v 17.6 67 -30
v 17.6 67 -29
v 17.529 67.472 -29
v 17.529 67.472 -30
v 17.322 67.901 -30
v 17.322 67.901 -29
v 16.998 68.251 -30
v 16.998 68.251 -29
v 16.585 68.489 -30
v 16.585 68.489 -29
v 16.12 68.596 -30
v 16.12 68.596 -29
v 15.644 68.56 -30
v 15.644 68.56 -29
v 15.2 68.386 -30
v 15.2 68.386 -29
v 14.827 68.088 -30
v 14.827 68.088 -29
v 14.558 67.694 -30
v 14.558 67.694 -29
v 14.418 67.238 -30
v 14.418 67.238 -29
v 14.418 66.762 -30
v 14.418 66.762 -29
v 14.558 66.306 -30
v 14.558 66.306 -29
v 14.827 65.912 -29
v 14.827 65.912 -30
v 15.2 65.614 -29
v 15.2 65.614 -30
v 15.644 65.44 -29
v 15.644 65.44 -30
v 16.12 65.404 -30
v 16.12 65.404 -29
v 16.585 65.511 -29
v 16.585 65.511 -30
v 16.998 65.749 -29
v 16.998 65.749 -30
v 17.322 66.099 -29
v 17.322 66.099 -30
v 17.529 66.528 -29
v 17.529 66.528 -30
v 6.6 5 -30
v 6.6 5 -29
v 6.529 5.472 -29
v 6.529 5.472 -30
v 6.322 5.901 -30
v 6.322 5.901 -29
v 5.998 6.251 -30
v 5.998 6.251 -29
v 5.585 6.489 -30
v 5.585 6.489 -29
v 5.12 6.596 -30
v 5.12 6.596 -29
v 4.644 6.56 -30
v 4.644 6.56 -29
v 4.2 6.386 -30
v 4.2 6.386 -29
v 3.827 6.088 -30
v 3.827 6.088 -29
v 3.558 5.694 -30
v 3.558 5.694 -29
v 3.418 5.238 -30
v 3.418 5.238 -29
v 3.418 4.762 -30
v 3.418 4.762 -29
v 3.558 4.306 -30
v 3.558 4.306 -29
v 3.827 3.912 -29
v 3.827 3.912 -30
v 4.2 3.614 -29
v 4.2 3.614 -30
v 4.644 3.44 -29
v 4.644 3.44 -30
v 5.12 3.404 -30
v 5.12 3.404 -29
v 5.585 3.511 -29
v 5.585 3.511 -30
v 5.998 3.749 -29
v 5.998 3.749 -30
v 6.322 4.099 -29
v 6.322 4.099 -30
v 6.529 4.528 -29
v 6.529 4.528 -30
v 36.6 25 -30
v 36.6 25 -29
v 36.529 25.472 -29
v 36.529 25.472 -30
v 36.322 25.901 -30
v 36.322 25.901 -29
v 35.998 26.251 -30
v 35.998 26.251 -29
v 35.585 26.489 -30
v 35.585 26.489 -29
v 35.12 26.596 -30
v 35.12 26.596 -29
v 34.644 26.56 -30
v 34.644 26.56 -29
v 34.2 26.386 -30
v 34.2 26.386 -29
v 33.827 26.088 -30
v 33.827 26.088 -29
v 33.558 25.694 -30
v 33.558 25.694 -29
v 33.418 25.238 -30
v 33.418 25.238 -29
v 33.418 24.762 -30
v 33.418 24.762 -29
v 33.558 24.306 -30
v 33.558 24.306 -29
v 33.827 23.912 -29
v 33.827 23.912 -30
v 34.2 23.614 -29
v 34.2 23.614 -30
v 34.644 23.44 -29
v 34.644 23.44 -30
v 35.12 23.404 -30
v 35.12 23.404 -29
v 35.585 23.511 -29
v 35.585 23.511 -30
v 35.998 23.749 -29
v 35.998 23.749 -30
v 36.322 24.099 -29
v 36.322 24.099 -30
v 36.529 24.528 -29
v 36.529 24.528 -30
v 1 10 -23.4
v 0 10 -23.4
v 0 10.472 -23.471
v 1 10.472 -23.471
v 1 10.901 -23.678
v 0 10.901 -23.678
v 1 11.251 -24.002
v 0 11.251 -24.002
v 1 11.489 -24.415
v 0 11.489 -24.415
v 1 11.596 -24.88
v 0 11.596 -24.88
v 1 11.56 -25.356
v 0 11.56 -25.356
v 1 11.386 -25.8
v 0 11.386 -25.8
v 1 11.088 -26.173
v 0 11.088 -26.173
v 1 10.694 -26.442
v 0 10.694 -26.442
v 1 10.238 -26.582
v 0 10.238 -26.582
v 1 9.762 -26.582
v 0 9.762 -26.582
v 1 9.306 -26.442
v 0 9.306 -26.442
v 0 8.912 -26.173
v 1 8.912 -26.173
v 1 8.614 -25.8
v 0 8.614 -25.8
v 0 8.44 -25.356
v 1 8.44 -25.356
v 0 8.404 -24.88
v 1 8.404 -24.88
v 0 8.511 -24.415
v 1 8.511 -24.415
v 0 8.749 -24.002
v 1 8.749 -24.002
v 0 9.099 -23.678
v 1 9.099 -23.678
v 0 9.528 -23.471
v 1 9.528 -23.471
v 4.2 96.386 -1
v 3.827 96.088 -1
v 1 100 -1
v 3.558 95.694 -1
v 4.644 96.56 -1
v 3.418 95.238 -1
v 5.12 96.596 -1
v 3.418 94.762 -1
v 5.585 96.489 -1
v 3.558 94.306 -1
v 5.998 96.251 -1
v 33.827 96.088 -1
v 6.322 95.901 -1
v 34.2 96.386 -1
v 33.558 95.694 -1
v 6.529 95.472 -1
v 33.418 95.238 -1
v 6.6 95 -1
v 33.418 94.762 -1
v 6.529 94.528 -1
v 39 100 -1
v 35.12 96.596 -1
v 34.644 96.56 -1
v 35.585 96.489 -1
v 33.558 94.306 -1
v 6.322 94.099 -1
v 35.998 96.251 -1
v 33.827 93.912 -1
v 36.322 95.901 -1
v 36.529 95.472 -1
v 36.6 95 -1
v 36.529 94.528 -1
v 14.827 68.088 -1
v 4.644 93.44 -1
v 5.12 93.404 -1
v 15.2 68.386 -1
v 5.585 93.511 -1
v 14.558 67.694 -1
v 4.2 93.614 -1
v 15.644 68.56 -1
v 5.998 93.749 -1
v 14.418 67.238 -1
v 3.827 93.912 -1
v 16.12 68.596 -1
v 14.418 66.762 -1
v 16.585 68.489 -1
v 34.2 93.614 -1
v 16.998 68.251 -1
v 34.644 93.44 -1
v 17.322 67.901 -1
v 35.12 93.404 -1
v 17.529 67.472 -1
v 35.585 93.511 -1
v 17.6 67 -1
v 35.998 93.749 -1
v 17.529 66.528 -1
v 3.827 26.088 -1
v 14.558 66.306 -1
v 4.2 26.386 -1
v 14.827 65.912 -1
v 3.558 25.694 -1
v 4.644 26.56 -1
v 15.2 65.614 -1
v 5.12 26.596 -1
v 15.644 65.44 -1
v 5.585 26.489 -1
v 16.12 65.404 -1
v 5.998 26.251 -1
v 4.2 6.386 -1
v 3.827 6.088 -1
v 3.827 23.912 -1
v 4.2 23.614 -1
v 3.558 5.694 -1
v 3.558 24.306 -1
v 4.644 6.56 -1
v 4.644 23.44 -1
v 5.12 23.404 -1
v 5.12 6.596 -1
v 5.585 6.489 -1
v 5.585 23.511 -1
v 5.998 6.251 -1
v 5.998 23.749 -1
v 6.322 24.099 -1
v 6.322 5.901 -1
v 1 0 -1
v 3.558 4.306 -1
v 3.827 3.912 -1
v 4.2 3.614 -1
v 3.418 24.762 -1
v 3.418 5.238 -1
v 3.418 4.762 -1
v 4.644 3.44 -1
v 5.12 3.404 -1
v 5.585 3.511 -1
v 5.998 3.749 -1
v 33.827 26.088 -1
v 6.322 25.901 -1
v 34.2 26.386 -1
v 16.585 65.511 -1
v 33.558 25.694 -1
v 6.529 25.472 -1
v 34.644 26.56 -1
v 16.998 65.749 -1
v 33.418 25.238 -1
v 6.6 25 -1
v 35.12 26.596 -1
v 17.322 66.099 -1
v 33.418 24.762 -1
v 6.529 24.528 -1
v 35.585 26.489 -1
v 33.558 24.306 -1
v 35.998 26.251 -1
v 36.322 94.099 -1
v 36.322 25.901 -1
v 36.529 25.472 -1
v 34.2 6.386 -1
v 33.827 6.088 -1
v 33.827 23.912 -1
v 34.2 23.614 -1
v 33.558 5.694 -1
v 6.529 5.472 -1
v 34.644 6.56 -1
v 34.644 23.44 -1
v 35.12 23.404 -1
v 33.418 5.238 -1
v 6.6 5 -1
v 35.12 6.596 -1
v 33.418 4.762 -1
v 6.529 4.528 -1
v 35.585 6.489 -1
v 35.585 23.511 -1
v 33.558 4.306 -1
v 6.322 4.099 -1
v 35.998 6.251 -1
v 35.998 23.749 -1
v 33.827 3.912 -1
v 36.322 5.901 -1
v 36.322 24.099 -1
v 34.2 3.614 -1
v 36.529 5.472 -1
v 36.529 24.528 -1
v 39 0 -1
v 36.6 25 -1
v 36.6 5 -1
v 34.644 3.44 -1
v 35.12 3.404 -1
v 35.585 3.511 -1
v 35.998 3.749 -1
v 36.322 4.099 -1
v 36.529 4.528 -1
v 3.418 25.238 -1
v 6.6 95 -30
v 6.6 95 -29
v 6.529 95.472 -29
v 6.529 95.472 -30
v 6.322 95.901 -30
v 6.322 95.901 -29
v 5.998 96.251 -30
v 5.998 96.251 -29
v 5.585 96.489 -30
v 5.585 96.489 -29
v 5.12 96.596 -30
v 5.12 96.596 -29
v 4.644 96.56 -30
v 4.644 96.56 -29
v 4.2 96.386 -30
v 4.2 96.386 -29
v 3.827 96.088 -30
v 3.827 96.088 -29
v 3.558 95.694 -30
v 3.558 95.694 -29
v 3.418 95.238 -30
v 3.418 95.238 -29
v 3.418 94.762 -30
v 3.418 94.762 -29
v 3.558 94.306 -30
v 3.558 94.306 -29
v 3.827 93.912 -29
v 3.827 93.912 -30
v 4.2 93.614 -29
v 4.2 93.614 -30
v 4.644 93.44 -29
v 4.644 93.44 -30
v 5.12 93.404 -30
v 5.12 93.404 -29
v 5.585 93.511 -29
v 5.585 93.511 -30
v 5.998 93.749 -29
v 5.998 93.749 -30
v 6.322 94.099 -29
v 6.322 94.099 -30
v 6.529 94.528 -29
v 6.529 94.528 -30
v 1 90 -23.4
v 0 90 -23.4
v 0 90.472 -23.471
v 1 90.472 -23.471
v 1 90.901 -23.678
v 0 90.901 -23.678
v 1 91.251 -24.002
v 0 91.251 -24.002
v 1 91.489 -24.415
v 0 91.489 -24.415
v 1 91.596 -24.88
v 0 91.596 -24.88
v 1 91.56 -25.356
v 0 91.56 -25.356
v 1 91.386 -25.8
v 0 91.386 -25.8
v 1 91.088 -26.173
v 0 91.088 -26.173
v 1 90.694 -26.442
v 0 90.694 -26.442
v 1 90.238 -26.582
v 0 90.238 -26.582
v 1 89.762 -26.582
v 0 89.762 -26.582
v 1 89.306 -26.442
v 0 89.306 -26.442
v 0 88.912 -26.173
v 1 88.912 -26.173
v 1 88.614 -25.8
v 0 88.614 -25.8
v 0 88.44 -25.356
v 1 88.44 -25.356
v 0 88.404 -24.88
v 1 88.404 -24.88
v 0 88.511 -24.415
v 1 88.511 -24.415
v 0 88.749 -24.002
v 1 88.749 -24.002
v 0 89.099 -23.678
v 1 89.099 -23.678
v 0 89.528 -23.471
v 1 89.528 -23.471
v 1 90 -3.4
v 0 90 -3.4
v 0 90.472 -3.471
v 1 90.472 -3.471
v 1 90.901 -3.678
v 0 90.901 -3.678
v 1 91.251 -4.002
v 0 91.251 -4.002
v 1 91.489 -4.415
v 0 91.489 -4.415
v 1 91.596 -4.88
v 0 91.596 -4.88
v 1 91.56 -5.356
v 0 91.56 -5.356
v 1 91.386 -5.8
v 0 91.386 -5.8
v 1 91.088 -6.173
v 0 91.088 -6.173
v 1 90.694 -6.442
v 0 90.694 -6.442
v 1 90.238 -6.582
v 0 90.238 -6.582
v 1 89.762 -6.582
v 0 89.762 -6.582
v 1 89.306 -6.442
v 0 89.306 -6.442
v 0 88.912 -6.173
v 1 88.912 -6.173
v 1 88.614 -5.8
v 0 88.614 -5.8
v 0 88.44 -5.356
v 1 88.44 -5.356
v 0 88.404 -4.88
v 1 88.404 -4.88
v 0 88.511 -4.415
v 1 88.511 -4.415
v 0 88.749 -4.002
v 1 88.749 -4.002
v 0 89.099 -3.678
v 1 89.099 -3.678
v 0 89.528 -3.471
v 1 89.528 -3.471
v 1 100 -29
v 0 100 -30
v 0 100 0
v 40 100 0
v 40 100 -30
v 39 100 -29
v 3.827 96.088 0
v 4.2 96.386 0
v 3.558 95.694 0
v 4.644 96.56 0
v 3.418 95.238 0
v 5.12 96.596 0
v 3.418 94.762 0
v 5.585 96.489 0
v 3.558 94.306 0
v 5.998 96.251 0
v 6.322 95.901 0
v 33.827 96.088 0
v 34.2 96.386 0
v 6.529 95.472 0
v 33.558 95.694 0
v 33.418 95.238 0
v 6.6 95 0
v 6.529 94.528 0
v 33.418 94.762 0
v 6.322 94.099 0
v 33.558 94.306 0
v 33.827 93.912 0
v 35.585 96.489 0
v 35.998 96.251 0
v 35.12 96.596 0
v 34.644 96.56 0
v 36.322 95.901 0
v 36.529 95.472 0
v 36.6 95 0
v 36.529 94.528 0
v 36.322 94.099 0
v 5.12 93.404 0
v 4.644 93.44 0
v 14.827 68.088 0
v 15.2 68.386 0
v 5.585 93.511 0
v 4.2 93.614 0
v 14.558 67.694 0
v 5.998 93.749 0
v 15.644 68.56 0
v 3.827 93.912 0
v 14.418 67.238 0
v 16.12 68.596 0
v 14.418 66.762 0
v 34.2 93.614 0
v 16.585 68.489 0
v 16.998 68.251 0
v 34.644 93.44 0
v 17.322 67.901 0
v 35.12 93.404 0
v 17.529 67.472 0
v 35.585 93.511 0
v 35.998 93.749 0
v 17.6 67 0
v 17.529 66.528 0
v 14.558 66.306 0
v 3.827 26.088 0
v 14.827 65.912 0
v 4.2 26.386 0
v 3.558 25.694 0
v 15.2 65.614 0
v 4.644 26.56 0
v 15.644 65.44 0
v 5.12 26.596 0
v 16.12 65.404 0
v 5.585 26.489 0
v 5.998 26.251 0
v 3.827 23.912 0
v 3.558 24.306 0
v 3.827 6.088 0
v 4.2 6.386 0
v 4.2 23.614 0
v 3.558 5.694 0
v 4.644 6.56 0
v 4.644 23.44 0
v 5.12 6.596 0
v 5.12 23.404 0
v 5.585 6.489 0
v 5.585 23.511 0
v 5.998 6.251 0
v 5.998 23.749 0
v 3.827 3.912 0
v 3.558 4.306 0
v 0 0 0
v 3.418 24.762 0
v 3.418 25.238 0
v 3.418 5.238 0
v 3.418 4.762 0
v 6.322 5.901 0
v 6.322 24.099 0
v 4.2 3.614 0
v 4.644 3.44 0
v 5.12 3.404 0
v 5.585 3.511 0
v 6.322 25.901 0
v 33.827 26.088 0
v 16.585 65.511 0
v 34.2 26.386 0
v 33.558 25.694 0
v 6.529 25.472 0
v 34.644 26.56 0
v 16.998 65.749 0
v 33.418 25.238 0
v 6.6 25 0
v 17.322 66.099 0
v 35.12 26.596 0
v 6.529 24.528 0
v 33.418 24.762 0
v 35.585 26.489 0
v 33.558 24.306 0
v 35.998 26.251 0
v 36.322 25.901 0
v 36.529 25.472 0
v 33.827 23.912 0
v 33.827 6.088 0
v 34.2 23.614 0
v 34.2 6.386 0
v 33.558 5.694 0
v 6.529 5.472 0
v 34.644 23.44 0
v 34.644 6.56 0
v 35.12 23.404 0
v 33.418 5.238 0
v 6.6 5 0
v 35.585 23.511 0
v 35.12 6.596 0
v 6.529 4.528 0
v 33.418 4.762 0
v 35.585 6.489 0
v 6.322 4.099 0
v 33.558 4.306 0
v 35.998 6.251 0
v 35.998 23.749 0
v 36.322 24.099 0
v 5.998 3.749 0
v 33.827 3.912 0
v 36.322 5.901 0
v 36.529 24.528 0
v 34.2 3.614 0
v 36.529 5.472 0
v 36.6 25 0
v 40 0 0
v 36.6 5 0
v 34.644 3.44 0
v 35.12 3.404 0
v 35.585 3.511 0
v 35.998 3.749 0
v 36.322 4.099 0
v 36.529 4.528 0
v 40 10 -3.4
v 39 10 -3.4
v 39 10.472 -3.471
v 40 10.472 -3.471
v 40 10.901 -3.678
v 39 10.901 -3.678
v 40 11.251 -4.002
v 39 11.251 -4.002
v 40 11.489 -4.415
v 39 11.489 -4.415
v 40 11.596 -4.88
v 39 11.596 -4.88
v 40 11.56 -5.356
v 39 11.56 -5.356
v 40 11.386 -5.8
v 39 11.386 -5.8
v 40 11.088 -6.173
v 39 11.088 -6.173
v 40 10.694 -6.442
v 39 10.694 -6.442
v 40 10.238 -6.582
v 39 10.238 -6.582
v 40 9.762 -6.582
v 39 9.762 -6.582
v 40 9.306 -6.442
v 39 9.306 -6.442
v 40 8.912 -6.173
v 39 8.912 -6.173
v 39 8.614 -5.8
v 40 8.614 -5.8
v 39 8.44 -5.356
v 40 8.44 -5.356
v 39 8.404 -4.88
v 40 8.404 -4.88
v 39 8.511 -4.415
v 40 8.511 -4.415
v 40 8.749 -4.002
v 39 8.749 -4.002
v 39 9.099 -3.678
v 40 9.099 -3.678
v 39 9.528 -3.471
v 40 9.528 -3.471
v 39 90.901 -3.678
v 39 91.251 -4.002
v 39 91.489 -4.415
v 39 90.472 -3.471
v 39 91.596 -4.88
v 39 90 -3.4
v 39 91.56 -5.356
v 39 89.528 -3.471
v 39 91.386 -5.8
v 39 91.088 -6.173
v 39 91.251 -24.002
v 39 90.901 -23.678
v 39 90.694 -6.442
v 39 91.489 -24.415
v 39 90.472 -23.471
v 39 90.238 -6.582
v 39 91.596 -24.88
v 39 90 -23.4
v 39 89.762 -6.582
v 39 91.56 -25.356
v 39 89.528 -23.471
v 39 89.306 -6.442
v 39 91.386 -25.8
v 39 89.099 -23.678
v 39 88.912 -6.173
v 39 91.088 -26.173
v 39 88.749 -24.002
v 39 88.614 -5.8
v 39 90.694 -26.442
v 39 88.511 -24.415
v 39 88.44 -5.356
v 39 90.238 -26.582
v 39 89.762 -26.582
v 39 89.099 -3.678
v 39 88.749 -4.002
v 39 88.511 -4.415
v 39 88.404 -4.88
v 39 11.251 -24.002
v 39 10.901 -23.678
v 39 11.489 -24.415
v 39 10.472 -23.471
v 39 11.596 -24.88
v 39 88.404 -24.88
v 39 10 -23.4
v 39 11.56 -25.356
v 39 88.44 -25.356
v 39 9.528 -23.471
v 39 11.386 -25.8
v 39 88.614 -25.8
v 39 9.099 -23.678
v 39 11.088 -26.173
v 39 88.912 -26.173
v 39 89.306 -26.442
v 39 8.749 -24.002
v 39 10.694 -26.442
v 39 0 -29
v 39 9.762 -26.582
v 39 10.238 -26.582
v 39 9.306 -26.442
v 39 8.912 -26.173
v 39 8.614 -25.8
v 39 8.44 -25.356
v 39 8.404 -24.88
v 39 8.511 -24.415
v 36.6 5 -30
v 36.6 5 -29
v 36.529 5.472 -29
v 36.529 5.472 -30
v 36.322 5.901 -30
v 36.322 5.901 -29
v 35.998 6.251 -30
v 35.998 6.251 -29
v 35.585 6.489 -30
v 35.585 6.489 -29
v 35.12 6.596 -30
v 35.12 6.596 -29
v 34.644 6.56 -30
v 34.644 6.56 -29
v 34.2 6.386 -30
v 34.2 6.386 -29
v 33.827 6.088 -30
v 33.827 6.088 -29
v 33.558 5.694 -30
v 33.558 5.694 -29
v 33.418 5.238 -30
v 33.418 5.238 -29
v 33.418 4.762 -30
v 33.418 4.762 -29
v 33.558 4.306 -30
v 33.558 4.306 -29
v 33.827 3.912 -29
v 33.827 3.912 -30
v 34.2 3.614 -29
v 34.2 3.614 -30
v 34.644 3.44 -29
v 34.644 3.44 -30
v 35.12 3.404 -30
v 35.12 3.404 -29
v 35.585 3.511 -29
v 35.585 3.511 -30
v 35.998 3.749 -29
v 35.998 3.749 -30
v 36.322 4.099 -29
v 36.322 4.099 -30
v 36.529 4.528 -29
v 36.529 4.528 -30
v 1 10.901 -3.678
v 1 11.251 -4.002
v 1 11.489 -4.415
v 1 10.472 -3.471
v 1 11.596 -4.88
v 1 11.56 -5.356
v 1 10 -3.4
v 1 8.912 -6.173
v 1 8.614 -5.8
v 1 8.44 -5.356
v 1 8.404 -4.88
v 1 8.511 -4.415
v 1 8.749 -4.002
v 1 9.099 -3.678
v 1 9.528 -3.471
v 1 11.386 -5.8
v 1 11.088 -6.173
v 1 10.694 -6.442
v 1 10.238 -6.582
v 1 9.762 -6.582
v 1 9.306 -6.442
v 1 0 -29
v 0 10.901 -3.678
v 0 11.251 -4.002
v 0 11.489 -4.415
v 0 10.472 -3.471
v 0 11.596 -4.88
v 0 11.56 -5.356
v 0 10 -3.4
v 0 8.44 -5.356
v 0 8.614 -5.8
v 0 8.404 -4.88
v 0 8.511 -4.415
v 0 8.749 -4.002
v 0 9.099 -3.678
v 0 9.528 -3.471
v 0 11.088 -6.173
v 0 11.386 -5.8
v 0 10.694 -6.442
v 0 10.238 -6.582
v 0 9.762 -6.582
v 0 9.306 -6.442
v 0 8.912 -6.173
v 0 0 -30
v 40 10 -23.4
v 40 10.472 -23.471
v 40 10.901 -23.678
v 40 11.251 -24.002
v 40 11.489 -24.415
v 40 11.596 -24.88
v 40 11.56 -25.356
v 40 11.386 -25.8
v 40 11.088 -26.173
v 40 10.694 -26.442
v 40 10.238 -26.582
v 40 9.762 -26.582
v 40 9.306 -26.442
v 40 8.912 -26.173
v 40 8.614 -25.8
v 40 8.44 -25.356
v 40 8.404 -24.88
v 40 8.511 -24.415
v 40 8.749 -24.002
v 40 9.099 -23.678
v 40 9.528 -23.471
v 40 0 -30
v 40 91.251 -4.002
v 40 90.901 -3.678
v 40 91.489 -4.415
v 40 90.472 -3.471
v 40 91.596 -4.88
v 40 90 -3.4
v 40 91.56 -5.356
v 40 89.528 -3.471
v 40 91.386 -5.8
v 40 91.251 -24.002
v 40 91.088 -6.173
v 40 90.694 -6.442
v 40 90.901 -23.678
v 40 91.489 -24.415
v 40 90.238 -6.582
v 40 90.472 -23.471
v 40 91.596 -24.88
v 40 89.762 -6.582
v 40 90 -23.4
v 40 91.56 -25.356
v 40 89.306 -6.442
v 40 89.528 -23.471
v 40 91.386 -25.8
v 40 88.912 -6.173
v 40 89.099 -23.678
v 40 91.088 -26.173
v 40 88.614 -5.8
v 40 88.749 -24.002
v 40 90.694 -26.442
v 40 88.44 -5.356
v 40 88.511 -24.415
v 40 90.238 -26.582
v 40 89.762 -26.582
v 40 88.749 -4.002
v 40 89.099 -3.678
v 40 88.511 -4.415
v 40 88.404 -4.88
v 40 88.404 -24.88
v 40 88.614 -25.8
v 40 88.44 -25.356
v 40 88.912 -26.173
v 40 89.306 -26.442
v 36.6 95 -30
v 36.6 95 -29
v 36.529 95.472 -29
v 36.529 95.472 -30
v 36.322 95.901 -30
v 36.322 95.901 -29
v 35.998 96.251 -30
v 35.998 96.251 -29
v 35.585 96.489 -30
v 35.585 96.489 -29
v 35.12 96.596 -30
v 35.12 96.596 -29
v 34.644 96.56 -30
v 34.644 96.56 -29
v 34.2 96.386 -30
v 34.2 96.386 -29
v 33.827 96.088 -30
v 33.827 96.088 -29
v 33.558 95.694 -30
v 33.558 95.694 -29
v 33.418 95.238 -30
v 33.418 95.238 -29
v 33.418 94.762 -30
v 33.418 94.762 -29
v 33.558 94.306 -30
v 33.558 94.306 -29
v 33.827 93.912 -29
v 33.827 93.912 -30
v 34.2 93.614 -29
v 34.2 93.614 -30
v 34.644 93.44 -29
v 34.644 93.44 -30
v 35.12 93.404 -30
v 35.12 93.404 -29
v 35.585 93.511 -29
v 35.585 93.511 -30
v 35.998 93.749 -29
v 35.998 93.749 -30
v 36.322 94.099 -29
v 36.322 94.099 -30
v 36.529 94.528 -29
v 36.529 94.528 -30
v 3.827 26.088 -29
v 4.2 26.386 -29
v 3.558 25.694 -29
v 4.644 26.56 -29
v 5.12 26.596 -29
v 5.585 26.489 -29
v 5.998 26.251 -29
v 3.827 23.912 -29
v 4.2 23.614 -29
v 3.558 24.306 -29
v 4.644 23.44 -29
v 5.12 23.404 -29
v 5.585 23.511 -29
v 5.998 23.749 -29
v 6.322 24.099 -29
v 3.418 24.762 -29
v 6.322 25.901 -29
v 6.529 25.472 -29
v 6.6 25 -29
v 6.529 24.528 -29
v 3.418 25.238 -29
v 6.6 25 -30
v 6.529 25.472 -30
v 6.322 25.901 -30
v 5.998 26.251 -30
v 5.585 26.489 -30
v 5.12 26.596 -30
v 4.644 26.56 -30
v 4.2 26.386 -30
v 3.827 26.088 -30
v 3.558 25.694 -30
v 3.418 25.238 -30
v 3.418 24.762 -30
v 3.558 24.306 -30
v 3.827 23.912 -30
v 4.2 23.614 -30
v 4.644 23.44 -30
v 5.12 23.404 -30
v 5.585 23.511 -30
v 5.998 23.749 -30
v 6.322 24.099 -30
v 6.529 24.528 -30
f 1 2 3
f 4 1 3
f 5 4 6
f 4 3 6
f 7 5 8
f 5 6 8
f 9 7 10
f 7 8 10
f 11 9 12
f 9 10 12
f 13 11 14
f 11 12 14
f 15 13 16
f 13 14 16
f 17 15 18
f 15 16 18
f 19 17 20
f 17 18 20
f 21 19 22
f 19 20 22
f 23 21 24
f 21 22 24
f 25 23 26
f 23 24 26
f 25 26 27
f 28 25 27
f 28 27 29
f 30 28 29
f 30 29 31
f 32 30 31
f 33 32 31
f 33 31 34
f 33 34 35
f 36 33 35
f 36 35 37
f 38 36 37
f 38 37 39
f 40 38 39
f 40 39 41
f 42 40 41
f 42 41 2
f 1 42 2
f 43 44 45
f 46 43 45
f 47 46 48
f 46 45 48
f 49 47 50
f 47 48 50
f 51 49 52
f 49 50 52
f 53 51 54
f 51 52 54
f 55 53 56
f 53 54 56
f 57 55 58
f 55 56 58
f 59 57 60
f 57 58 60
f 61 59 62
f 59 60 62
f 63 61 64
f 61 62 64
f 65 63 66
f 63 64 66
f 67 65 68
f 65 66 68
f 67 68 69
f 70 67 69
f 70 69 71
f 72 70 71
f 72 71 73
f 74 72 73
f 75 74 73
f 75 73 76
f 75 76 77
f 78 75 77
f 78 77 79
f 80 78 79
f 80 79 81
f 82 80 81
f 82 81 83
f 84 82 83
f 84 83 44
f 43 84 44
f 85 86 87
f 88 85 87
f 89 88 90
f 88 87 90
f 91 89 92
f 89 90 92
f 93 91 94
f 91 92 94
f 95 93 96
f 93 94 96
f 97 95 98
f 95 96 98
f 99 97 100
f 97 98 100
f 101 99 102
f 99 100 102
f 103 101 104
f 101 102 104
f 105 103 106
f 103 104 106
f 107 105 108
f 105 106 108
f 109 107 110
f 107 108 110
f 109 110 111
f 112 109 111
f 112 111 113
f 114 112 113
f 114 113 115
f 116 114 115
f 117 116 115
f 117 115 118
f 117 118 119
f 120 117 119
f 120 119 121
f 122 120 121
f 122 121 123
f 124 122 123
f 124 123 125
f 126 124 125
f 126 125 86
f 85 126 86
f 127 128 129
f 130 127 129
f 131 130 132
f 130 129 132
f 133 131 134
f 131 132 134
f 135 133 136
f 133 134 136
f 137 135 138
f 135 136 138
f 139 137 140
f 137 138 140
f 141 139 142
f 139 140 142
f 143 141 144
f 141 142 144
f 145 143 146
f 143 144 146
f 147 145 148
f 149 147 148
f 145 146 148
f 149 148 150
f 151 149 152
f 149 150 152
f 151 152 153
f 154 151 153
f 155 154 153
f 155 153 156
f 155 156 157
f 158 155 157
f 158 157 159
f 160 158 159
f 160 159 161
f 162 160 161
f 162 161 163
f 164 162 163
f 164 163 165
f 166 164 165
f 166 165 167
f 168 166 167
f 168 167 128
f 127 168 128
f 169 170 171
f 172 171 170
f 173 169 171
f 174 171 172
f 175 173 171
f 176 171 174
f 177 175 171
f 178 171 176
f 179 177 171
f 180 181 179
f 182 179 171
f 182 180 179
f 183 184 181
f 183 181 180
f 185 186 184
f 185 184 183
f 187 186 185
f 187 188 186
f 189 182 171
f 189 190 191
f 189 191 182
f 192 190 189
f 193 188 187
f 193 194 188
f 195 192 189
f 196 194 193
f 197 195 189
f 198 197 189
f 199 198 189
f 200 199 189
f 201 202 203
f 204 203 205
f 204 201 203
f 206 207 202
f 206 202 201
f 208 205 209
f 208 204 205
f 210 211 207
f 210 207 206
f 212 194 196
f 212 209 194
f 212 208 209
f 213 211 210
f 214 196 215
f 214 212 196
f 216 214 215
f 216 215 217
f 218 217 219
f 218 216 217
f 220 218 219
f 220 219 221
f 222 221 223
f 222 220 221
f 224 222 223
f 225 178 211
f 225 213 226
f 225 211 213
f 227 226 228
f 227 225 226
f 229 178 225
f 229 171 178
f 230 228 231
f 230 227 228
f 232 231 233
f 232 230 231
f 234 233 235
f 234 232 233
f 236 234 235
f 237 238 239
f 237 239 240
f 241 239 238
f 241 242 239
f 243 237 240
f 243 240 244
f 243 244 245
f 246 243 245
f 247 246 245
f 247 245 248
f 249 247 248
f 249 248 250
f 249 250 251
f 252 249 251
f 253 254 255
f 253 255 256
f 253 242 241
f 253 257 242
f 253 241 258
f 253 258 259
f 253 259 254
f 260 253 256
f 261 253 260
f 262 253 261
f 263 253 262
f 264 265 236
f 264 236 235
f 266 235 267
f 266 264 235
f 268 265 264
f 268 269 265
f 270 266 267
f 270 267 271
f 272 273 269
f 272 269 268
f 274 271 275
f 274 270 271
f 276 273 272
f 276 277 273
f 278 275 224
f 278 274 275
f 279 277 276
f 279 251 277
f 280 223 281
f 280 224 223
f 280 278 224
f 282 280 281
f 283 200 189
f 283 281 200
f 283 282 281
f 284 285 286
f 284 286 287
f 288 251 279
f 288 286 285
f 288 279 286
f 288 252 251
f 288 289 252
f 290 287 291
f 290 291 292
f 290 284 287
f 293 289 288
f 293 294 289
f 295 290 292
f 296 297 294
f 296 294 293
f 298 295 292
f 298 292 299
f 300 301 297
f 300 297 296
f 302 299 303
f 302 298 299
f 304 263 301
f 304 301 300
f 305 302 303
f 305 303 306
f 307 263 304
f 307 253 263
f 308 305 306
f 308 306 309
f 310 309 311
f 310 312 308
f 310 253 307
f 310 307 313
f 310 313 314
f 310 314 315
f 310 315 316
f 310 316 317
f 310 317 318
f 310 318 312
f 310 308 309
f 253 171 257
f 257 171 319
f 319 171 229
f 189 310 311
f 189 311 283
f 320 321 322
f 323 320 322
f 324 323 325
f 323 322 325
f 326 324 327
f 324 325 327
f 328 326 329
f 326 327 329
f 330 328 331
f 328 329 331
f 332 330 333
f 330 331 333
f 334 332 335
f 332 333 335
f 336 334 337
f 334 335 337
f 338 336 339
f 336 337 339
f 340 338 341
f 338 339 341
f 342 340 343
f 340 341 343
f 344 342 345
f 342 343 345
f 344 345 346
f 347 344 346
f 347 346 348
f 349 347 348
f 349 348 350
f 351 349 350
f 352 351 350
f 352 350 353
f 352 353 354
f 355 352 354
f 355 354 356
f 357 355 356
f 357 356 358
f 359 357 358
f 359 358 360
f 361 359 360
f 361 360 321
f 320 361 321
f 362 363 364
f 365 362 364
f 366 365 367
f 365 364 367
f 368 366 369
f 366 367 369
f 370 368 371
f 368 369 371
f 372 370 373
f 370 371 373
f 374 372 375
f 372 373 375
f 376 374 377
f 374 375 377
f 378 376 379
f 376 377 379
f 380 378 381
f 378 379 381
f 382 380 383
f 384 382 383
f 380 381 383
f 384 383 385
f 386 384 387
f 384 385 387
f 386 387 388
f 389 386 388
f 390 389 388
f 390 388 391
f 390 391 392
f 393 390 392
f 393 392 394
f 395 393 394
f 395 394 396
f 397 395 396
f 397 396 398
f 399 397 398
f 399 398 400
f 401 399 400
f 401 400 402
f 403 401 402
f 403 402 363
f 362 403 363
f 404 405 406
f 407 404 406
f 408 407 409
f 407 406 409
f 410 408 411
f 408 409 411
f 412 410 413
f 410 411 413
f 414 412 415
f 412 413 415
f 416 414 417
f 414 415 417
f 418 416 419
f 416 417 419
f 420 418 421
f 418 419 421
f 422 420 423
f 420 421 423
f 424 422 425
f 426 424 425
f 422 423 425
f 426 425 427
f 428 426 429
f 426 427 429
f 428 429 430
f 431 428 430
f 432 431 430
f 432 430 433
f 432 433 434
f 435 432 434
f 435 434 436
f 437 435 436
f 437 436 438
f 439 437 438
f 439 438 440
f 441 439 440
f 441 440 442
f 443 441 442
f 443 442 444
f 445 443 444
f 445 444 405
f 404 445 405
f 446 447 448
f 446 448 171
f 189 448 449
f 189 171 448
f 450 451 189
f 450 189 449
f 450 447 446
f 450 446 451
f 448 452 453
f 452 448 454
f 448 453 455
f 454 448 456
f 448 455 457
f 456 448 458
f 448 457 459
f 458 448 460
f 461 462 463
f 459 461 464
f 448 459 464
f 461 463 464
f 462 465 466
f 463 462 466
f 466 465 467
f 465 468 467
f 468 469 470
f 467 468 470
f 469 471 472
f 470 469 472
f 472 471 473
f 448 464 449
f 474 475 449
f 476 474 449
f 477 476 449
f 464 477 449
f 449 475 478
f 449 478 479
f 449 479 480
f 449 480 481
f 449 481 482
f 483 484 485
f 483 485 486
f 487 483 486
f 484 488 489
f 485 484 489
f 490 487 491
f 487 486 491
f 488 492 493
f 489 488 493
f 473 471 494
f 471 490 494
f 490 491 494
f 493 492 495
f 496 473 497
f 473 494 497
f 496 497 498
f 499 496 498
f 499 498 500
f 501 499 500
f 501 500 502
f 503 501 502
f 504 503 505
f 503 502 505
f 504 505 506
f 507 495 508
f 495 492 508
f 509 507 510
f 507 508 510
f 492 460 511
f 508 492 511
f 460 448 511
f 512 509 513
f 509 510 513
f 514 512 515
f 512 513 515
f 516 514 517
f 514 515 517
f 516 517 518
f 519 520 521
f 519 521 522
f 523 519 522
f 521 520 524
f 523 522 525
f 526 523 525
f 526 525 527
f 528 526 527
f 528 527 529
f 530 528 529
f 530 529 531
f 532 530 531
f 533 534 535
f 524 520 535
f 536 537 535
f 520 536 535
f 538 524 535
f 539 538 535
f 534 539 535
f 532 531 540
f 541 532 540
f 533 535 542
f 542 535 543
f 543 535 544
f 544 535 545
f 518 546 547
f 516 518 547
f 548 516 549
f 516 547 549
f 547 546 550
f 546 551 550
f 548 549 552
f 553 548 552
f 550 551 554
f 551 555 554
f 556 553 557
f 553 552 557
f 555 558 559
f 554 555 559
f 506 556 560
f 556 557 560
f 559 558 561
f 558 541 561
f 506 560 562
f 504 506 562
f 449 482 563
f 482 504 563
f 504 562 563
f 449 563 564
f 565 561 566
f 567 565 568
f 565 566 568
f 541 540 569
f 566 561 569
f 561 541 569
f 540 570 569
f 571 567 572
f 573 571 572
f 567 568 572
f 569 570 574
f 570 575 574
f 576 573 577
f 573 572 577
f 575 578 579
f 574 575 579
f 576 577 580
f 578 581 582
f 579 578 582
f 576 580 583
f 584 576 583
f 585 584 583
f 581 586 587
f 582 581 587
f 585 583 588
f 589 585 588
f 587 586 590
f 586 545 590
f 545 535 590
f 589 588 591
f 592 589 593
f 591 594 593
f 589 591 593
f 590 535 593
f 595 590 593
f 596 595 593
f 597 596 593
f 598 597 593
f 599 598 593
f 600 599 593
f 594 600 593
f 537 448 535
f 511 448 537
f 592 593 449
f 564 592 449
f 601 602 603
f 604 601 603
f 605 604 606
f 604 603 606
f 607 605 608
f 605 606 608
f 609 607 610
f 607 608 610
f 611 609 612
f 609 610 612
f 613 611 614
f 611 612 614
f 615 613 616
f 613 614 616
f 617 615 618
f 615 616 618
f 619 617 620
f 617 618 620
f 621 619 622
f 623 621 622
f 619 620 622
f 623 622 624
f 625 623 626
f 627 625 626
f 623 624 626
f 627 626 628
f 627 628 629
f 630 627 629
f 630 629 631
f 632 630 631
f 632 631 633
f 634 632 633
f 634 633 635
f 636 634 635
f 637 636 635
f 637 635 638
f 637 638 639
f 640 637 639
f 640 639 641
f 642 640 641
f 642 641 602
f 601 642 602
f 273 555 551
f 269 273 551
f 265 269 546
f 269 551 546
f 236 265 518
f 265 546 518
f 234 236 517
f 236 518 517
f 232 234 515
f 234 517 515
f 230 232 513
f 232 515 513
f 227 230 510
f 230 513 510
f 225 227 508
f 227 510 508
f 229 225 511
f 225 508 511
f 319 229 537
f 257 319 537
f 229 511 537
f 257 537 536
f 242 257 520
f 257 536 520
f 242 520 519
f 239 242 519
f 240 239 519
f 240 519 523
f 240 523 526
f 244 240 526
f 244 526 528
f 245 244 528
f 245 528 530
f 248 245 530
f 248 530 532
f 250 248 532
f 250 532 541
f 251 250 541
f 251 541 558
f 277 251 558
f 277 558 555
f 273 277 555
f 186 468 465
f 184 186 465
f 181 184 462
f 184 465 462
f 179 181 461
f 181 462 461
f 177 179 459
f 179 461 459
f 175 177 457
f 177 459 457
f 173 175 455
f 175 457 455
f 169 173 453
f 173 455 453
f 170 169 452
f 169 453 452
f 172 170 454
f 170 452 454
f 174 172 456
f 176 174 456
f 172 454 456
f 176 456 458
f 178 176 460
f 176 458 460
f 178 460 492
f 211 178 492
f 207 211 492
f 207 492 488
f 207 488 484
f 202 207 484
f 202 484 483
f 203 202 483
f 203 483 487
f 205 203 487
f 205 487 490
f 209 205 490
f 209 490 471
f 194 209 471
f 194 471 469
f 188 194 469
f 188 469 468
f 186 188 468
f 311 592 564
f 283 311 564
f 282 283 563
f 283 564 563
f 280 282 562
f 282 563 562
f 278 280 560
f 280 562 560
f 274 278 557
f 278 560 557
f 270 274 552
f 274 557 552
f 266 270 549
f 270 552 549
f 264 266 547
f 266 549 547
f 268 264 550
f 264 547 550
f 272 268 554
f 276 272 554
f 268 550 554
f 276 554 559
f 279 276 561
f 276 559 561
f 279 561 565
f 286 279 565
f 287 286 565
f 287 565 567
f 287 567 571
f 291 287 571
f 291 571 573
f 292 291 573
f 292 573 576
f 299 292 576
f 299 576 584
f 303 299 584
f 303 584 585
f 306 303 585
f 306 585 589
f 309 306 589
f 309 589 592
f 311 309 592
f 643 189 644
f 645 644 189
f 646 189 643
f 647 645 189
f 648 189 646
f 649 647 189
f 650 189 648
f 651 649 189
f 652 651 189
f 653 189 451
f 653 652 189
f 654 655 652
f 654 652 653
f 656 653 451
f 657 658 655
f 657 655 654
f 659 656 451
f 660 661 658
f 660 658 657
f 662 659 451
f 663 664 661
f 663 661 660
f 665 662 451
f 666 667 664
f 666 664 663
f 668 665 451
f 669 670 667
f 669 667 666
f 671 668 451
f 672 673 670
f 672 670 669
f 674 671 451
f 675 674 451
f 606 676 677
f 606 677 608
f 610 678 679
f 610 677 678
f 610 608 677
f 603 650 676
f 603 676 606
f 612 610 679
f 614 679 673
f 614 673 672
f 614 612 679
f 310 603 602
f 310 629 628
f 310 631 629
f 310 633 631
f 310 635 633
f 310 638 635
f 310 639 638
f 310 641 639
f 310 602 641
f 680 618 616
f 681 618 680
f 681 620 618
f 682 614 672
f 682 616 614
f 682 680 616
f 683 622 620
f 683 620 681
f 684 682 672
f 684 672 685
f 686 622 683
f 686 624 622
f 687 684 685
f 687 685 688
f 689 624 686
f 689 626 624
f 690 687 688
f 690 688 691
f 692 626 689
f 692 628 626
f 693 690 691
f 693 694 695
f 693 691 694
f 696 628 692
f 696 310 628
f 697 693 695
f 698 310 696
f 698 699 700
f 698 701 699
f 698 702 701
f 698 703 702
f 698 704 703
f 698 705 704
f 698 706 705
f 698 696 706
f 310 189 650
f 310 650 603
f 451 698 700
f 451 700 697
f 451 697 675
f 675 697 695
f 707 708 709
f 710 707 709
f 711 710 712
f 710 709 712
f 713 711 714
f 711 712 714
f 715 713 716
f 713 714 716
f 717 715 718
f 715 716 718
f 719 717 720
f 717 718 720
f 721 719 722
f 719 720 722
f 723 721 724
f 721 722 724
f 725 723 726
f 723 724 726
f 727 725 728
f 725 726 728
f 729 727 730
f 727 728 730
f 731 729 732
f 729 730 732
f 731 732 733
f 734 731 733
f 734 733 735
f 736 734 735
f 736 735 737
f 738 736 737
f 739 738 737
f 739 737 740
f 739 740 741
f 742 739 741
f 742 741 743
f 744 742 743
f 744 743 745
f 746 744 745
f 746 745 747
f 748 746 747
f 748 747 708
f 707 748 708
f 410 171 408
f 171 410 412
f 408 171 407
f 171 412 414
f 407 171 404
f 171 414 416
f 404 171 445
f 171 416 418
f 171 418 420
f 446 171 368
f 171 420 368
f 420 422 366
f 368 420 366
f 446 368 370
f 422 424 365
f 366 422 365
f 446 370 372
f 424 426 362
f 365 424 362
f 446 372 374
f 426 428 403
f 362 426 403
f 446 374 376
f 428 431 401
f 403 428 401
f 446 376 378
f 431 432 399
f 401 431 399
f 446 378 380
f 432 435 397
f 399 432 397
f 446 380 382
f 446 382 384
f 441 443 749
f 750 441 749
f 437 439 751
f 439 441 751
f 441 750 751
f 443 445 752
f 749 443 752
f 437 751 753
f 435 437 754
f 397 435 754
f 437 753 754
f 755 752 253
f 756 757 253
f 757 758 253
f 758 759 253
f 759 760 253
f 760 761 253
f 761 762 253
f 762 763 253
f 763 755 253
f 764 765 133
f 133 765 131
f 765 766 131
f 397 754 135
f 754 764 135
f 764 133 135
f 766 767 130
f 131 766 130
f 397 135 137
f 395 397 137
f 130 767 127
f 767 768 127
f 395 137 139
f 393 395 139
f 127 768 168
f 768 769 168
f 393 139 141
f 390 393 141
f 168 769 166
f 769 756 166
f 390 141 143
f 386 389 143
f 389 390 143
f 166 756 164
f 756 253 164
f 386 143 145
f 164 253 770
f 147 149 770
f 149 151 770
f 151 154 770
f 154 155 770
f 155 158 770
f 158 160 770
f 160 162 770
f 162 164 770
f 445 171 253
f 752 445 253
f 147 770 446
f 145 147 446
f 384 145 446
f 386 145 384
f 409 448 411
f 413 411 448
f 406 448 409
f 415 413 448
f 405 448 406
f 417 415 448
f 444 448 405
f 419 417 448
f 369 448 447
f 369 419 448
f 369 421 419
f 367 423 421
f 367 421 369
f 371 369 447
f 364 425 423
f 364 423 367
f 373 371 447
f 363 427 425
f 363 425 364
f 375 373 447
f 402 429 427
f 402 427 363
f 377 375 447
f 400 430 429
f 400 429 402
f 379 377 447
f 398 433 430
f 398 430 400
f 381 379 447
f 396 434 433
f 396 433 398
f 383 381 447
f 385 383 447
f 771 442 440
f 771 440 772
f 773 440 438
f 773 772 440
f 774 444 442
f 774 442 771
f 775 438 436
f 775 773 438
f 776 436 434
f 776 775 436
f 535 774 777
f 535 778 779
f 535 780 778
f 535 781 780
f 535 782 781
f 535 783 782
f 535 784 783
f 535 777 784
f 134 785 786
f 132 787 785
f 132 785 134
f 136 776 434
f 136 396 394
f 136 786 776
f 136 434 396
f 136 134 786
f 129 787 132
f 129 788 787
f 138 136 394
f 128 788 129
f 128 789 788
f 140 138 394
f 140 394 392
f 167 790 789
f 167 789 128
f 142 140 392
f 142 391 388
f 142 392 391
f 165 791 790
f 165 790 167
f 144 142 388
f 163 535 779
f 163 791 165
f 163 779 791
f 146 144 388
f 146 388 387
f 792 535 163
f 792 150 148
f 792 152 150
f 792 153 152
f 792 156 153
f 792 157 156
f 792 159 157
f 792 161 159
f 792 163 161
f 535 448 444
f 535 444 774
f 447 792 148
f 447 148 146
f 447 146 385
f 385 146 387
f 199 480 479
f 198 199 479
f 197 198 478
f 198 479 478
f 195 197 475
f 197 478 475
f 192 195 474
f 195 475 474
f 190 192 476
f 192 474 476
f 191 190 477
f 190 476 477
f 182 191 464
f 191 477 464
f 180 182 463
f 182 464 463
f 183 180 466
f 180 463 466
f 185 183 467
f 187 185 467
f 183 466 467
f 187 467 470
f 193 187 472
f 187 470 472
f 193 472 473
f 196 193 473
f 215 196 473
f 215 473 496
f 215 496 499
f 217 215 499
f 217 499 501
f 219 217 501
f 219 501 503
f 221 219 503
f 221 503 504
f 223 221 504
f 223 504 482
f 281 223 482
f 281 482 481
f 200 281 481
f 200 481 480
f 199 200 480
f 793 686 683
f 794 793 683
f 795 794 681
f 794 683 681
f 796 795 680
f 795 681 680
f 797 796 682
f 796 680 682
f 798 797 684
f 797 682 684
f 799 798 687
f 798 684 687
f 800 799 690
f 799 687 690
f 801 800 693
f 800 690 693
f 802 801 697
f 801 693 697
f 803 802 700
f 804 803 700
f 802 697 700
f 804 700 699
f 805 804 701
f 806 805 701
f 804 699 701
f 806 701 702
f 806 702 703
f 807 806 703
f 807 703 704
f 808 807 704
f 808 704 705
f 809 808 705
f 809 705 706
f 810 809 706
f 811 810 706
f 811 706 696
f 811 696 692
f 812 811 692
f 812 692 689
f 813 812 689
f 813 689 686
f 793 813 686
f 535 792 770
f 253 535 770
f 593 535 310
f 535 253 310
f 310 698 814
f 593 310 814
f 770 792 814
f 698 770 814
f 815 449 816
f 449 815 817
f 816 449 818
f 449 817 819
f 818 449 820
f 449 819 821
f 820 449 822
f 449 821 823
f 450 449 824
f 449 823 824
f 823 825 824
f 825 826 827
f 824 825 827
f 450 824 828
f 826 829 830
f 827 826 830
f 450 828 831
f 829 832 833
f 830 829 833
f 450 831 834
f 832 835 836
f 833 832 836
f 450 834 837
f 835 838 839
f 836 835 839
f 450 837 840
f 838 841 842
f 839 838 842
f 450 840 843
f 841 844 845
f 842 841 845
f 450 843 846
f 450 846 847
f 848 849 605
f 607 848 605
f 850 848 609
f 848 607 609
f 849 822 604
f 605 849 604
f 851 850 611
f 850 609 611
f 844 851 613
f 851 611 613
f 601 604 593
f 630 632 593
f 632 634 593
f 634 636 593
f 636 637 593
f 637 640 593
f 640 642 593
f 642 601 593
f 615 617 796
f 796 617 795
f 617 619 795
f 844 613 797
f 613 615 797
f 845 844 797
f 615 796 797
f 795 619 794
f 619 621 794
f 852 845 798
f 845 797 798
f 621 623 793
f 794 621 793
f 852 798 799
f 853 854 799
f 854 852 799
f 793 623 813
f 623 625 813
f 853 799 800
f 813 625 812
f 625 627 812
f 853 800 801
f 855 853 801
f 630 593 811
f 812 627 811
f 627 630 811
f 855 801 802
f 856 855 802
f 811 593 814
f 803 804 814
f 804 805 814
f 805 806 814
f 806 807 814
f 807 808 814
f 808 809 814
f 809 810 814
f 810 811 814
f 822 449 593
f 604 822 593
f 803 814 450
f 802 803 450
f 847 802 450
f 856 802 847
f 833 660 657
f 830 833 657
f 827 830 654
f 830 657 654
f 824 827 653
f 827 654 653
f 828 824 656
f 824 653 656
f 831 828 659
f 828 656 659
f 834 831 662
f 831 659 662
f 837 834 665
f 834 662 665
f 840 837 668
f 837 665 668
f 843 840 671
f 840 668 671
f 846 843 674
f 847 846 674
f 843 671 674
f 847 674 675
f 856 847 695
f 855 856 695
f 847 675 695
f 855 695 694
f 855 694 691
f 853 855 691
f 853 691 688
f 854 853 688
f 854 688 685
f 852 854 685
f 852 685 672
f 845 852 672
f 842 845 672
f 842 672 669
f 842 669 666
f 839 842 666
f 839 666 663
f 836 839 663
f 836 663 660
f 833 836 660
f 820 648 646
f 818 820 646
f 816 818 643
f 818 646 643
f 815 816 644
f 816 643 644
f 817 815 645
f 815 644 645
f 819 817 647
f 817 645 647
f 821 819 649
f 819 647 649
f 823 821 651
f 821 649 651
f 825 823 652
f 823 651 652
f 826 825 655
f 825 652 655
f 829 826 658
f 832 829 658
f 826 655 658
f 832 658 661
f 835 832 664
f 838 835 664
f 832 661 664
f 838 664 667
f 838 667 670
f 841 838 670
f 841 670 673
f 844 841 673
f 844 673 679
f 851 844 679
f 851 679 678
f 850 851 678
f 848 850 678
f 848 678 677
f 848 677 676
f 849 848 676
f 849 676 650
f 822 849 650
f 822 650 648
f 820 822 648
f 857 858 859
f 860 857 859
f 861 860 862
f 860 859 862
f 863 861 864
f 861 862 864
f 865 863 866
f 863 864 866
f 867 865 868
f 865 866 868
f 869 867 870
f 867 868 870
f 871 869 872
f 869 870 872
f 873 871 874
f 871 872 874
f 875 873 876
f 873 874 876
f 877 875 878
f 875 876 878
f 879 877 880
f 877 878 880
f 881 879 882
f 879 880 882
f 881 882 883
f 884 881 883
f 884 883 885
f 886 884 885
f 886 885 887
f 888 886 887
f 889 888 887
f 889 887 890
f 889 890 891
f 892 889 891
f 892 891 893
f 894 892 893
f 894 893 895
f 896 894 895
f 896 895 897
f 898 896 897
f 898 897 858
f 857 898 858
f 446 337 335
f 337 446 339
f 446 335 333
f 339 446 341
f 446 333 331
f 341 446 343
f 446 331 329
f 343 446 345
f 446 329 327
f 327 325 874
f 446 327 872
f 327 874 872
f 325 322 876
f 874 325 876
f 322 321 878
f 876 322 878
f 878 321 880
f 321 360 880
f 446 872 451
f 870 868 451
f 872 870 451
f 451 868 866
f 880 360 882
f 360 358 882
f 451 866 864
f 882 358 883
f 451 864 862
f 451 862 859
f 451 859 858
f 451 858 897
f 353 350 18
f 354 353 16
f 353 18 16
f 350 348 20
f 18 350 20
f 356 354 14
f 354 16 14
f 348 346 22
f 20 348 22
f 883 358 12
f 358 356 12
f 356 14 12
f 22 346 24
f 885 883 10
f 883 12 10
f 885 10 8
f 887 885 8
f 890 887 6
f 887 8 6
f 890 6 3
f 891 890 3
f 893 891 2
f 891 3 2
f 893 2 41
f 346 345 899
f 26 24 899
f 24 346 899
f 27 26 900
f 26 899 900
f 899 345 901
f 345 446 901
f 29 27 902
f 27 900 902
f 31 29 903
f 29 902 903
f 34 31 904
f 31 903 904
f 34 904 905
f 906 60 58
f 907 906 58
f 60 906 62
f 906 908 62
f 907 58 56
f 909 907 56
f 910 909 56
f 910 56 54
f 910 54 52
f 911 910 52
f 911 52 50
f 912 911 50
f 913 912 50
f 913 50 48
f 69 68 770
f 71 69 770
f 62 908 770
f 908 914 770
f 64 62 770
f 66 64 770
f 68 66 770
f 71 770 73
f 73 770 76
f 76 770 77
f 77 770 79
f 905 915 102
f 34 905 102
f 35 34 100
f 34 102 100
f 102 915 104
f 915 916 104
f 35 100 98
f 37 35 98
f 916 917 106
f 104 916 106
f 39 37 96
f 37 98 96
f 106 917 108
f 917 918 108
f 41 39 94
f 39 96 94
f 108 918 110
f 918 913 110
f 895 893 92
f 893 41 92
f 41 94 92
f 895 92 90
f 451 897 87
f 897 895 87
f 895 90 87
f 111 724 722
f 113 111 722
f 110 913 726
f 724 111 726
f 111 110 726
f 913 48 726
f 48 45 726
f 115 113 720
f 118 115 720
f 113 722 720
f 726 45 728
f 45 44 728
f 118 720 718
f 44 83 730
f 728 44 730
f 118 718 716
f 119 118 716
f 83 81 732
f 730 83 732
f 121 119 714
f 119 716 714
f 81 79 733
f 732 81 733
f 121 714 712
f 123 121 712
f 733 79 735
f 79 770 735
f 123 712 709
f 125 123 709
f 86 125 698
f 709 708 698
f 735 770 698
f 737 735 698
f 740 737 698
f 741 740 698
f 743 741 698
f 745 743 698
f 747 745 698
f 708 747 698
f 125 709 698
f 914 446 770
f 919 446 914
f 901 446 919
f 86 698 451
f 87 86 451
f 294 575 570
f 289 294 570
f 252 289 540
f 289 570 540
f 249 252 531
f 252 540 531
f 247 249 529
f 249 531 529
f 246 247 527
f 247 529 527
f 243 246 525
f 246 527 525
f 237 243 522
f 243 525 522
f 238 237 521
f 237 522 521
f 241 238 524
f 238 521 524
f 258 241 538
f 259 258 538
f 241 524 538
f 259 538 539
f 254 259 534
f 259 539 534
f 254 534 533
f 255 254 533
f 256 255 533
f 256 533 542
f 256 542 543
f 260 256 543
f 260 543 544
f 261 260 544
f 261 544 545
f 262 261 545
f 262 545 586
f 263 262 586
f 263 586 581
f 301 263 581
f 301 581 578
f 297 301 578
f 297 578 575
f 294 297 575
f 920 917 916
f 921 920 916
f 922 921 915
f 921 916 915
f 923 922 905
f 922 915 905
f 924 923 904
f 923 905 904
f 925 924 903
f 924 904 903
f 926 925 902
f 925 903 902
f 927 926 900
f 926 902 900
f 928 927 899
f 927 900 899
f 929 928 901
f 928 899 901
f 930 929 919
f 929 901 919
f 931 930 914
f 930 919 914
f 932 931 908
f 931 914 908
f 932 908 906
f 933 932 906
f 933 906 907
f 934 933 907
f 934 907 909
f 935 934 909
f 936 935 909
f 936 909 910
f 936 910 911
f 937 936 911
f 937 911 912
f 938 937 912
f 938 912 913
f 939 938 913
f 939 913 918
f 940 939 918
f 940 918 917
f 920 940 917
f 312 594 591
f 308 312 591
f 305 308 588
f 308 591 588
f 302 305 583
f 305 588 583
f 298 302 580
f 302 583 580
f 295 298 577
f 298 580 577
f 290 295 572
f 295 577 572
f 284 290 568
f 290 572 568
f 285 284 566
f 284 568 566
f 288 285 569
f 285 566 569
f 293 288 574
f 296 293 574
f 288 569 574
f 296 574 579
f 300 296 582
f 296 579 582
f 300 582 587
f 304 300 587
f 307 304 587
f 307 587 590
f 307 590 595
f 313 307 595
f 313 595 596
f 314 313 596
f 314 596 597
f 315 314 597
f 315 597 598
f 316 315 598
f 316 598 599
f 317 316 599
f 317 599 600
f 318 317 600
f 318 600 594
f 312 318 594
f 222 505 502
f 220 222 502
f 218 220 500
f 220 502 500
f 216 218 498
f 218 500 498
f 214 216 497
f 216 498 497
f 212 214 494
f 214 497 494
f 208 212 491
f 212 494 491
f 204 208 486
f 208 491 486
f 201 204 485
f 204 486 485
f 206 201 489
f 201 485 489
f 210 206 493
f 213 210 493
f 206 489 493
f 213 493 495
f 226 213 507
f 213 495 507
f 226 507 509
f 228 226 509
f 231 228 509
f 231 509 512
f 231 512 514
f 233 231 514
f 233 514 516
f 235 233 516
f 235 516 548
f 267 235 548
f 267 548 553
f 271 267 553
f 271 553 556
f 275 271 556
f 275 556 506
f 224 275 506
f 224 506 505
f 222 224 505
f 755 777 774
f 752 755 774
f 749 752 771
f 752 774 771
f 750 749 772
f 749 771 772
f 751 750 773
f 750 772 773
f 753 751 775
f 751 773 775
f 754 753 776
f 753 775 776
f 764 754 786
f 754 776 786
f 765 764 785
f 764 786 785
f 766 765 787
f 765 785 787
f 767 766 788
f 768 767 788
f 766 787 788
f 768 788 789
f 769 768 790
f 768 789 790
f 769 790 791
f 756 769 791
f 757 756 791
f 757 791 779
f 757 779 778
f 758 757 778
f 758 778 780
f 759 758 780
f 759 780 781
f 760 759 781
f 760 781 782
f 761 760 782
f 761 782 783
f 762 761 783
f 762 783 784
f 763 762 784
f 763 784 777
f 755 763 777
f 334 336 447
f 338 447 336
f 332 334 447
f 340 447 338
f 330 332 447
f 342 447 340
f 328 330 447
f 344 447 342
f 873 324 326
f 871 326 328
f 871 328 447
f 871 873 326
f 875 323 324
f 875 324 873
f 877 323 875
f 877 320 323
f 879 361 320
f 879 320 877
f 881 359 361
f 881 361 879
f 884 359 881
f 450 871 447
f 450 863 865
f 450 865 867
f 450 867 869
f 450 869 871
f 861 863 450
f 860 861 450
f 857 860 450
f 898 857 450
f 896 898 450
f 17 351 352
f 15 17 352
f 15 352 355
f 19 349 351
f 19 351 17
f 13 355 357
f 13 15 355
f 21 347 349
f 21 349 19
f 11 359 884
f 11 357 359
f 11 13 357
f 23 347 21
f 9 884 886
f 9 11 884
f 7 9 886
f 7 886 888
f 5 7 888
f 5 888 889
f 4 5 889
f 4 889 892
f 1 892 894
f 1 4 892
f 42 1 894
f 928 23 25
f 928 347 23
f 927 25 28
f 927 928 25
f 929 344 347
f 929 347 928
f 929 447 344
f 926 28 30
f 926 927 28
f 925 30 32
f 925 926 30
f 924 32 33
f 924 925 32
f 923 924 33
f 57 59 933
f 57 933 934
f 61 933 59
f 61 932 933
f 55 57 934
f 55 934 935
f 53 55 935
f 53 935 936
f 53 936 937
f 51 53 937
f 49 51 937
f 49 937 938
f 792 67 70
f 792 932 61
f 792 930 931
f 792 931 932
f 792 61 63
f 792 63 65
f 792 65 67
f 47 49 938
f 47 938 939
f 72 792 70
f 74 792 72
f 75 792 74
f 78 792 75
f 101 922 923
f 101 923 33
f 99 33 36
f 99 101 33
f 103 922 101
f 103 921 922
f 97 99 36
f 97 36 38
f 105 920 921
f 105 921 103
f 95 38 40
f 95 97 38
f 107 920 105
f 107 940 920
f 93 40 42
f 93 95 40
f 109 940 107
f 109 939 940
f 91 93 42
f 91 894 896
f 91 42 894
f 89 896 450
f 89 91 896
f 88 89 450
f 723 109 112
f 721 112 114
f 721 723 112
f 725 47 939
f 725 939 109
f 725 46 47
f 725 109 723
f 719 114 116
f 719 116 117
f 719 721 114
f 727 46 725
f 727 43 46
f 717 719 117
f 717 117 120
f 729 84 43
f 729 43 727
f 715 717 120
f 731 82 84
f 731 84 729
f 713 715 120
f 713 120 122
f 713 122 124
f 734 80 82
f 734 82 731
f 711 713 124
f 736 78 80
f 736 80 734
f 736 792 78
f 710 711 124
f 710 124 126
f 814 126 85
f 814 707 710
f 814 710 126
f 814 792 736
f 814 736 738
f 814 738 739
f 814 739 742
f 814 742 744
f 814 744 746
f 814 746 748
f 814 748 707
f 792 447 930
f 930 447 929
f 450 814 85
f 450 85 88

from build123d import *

# Parameters (mm, degrees)
SKETCH_1_W          = 40
SKETCH_1_H          = 30
SKETCH_1_W_2        = 38
SKETCH_1_H_2        = 28
EXTRUDE_1_DEPTH     = 100
SKETCH_2_R          = 1.6
CUT_EXTRUDE_1_DEPTH = 112.803398875
SKETCH_3_R          = 1.6
CUT_EXTRUDE_2_DEPTH = 112.803398875
SKETCH_4_R          = 1.6
CUT_EXTRUDE_3_DEPTH = 112.803398875


with BuildPart() as part:
    # 草图1 → 拉伸-薄壁1 (new body)
    with BuildSketch(Plane(origin=(0, 0, 0), x_dir=(1, 0, 0), z_dir=(0, 1, 0))):
        with Locations((20, 15)):
            Rectangle(SKETCH_1_W, SKETCH_1_H)
        with Locations((20, 15)):
            Rectangle(SKETCH_1_W_2, SKETCH_1_H_2, mode=Mode.SUBTRACT)
    extrude(amount=EXTRUDE_1_DEPTH)

    # 草图2 → 切除-拉伸1 (cut, through all)
    with BuildSketch(Plane.XY):
        with Locations((5, 95)):
            Circle(SKETCH_2_R)
        with Locations((35, 95)):
            Circle(SKETCH_2_R)
        with Locations((35, 25)):
            Circle(SKETCH_2_R)
        with Locations((5, 25)):
            Circle(SKETCH_2_R)
        with Locations((5, 5)):
            Circle(SKETCH_2_R)
        with Locations((35, 5)):
            Circle(SKETCH_2_R)
    extrude(amount=-CUT_EXTRUDE_1_DEPTH, mode=Mode.SUBTRACT)

    # 草图3 → 切除-拉伸2 (cut, through all)
    with BuildSketch(Plane.ZY):
        with Locations((-25, 90)):
            Circle(SKETCH_3_R)
        with Locations((-5, 90)):
            Circle(SKETCH_3_R)
        with Locations((-25, 10)):
            Circle(SKETCH_3_R)
        with Locations((-5, 10)):
            Circle(SKETCH_3_R)
    extrude(amount=-CUT_EXTRUDE_2_DEPTH, mode=Mode.SUBTRACT)

    # 草图4 → 切除-拉伸3 (cut, through all)
    with BuildSketch(Plane.XY):
        with Locations((16, 67)):
            Circle(SKETCH_4_R)
    extrude(amount=-CUT_EXTRUDE_3_DEPTH, mode=Mode.SUBTRACT)


solid = part.part
